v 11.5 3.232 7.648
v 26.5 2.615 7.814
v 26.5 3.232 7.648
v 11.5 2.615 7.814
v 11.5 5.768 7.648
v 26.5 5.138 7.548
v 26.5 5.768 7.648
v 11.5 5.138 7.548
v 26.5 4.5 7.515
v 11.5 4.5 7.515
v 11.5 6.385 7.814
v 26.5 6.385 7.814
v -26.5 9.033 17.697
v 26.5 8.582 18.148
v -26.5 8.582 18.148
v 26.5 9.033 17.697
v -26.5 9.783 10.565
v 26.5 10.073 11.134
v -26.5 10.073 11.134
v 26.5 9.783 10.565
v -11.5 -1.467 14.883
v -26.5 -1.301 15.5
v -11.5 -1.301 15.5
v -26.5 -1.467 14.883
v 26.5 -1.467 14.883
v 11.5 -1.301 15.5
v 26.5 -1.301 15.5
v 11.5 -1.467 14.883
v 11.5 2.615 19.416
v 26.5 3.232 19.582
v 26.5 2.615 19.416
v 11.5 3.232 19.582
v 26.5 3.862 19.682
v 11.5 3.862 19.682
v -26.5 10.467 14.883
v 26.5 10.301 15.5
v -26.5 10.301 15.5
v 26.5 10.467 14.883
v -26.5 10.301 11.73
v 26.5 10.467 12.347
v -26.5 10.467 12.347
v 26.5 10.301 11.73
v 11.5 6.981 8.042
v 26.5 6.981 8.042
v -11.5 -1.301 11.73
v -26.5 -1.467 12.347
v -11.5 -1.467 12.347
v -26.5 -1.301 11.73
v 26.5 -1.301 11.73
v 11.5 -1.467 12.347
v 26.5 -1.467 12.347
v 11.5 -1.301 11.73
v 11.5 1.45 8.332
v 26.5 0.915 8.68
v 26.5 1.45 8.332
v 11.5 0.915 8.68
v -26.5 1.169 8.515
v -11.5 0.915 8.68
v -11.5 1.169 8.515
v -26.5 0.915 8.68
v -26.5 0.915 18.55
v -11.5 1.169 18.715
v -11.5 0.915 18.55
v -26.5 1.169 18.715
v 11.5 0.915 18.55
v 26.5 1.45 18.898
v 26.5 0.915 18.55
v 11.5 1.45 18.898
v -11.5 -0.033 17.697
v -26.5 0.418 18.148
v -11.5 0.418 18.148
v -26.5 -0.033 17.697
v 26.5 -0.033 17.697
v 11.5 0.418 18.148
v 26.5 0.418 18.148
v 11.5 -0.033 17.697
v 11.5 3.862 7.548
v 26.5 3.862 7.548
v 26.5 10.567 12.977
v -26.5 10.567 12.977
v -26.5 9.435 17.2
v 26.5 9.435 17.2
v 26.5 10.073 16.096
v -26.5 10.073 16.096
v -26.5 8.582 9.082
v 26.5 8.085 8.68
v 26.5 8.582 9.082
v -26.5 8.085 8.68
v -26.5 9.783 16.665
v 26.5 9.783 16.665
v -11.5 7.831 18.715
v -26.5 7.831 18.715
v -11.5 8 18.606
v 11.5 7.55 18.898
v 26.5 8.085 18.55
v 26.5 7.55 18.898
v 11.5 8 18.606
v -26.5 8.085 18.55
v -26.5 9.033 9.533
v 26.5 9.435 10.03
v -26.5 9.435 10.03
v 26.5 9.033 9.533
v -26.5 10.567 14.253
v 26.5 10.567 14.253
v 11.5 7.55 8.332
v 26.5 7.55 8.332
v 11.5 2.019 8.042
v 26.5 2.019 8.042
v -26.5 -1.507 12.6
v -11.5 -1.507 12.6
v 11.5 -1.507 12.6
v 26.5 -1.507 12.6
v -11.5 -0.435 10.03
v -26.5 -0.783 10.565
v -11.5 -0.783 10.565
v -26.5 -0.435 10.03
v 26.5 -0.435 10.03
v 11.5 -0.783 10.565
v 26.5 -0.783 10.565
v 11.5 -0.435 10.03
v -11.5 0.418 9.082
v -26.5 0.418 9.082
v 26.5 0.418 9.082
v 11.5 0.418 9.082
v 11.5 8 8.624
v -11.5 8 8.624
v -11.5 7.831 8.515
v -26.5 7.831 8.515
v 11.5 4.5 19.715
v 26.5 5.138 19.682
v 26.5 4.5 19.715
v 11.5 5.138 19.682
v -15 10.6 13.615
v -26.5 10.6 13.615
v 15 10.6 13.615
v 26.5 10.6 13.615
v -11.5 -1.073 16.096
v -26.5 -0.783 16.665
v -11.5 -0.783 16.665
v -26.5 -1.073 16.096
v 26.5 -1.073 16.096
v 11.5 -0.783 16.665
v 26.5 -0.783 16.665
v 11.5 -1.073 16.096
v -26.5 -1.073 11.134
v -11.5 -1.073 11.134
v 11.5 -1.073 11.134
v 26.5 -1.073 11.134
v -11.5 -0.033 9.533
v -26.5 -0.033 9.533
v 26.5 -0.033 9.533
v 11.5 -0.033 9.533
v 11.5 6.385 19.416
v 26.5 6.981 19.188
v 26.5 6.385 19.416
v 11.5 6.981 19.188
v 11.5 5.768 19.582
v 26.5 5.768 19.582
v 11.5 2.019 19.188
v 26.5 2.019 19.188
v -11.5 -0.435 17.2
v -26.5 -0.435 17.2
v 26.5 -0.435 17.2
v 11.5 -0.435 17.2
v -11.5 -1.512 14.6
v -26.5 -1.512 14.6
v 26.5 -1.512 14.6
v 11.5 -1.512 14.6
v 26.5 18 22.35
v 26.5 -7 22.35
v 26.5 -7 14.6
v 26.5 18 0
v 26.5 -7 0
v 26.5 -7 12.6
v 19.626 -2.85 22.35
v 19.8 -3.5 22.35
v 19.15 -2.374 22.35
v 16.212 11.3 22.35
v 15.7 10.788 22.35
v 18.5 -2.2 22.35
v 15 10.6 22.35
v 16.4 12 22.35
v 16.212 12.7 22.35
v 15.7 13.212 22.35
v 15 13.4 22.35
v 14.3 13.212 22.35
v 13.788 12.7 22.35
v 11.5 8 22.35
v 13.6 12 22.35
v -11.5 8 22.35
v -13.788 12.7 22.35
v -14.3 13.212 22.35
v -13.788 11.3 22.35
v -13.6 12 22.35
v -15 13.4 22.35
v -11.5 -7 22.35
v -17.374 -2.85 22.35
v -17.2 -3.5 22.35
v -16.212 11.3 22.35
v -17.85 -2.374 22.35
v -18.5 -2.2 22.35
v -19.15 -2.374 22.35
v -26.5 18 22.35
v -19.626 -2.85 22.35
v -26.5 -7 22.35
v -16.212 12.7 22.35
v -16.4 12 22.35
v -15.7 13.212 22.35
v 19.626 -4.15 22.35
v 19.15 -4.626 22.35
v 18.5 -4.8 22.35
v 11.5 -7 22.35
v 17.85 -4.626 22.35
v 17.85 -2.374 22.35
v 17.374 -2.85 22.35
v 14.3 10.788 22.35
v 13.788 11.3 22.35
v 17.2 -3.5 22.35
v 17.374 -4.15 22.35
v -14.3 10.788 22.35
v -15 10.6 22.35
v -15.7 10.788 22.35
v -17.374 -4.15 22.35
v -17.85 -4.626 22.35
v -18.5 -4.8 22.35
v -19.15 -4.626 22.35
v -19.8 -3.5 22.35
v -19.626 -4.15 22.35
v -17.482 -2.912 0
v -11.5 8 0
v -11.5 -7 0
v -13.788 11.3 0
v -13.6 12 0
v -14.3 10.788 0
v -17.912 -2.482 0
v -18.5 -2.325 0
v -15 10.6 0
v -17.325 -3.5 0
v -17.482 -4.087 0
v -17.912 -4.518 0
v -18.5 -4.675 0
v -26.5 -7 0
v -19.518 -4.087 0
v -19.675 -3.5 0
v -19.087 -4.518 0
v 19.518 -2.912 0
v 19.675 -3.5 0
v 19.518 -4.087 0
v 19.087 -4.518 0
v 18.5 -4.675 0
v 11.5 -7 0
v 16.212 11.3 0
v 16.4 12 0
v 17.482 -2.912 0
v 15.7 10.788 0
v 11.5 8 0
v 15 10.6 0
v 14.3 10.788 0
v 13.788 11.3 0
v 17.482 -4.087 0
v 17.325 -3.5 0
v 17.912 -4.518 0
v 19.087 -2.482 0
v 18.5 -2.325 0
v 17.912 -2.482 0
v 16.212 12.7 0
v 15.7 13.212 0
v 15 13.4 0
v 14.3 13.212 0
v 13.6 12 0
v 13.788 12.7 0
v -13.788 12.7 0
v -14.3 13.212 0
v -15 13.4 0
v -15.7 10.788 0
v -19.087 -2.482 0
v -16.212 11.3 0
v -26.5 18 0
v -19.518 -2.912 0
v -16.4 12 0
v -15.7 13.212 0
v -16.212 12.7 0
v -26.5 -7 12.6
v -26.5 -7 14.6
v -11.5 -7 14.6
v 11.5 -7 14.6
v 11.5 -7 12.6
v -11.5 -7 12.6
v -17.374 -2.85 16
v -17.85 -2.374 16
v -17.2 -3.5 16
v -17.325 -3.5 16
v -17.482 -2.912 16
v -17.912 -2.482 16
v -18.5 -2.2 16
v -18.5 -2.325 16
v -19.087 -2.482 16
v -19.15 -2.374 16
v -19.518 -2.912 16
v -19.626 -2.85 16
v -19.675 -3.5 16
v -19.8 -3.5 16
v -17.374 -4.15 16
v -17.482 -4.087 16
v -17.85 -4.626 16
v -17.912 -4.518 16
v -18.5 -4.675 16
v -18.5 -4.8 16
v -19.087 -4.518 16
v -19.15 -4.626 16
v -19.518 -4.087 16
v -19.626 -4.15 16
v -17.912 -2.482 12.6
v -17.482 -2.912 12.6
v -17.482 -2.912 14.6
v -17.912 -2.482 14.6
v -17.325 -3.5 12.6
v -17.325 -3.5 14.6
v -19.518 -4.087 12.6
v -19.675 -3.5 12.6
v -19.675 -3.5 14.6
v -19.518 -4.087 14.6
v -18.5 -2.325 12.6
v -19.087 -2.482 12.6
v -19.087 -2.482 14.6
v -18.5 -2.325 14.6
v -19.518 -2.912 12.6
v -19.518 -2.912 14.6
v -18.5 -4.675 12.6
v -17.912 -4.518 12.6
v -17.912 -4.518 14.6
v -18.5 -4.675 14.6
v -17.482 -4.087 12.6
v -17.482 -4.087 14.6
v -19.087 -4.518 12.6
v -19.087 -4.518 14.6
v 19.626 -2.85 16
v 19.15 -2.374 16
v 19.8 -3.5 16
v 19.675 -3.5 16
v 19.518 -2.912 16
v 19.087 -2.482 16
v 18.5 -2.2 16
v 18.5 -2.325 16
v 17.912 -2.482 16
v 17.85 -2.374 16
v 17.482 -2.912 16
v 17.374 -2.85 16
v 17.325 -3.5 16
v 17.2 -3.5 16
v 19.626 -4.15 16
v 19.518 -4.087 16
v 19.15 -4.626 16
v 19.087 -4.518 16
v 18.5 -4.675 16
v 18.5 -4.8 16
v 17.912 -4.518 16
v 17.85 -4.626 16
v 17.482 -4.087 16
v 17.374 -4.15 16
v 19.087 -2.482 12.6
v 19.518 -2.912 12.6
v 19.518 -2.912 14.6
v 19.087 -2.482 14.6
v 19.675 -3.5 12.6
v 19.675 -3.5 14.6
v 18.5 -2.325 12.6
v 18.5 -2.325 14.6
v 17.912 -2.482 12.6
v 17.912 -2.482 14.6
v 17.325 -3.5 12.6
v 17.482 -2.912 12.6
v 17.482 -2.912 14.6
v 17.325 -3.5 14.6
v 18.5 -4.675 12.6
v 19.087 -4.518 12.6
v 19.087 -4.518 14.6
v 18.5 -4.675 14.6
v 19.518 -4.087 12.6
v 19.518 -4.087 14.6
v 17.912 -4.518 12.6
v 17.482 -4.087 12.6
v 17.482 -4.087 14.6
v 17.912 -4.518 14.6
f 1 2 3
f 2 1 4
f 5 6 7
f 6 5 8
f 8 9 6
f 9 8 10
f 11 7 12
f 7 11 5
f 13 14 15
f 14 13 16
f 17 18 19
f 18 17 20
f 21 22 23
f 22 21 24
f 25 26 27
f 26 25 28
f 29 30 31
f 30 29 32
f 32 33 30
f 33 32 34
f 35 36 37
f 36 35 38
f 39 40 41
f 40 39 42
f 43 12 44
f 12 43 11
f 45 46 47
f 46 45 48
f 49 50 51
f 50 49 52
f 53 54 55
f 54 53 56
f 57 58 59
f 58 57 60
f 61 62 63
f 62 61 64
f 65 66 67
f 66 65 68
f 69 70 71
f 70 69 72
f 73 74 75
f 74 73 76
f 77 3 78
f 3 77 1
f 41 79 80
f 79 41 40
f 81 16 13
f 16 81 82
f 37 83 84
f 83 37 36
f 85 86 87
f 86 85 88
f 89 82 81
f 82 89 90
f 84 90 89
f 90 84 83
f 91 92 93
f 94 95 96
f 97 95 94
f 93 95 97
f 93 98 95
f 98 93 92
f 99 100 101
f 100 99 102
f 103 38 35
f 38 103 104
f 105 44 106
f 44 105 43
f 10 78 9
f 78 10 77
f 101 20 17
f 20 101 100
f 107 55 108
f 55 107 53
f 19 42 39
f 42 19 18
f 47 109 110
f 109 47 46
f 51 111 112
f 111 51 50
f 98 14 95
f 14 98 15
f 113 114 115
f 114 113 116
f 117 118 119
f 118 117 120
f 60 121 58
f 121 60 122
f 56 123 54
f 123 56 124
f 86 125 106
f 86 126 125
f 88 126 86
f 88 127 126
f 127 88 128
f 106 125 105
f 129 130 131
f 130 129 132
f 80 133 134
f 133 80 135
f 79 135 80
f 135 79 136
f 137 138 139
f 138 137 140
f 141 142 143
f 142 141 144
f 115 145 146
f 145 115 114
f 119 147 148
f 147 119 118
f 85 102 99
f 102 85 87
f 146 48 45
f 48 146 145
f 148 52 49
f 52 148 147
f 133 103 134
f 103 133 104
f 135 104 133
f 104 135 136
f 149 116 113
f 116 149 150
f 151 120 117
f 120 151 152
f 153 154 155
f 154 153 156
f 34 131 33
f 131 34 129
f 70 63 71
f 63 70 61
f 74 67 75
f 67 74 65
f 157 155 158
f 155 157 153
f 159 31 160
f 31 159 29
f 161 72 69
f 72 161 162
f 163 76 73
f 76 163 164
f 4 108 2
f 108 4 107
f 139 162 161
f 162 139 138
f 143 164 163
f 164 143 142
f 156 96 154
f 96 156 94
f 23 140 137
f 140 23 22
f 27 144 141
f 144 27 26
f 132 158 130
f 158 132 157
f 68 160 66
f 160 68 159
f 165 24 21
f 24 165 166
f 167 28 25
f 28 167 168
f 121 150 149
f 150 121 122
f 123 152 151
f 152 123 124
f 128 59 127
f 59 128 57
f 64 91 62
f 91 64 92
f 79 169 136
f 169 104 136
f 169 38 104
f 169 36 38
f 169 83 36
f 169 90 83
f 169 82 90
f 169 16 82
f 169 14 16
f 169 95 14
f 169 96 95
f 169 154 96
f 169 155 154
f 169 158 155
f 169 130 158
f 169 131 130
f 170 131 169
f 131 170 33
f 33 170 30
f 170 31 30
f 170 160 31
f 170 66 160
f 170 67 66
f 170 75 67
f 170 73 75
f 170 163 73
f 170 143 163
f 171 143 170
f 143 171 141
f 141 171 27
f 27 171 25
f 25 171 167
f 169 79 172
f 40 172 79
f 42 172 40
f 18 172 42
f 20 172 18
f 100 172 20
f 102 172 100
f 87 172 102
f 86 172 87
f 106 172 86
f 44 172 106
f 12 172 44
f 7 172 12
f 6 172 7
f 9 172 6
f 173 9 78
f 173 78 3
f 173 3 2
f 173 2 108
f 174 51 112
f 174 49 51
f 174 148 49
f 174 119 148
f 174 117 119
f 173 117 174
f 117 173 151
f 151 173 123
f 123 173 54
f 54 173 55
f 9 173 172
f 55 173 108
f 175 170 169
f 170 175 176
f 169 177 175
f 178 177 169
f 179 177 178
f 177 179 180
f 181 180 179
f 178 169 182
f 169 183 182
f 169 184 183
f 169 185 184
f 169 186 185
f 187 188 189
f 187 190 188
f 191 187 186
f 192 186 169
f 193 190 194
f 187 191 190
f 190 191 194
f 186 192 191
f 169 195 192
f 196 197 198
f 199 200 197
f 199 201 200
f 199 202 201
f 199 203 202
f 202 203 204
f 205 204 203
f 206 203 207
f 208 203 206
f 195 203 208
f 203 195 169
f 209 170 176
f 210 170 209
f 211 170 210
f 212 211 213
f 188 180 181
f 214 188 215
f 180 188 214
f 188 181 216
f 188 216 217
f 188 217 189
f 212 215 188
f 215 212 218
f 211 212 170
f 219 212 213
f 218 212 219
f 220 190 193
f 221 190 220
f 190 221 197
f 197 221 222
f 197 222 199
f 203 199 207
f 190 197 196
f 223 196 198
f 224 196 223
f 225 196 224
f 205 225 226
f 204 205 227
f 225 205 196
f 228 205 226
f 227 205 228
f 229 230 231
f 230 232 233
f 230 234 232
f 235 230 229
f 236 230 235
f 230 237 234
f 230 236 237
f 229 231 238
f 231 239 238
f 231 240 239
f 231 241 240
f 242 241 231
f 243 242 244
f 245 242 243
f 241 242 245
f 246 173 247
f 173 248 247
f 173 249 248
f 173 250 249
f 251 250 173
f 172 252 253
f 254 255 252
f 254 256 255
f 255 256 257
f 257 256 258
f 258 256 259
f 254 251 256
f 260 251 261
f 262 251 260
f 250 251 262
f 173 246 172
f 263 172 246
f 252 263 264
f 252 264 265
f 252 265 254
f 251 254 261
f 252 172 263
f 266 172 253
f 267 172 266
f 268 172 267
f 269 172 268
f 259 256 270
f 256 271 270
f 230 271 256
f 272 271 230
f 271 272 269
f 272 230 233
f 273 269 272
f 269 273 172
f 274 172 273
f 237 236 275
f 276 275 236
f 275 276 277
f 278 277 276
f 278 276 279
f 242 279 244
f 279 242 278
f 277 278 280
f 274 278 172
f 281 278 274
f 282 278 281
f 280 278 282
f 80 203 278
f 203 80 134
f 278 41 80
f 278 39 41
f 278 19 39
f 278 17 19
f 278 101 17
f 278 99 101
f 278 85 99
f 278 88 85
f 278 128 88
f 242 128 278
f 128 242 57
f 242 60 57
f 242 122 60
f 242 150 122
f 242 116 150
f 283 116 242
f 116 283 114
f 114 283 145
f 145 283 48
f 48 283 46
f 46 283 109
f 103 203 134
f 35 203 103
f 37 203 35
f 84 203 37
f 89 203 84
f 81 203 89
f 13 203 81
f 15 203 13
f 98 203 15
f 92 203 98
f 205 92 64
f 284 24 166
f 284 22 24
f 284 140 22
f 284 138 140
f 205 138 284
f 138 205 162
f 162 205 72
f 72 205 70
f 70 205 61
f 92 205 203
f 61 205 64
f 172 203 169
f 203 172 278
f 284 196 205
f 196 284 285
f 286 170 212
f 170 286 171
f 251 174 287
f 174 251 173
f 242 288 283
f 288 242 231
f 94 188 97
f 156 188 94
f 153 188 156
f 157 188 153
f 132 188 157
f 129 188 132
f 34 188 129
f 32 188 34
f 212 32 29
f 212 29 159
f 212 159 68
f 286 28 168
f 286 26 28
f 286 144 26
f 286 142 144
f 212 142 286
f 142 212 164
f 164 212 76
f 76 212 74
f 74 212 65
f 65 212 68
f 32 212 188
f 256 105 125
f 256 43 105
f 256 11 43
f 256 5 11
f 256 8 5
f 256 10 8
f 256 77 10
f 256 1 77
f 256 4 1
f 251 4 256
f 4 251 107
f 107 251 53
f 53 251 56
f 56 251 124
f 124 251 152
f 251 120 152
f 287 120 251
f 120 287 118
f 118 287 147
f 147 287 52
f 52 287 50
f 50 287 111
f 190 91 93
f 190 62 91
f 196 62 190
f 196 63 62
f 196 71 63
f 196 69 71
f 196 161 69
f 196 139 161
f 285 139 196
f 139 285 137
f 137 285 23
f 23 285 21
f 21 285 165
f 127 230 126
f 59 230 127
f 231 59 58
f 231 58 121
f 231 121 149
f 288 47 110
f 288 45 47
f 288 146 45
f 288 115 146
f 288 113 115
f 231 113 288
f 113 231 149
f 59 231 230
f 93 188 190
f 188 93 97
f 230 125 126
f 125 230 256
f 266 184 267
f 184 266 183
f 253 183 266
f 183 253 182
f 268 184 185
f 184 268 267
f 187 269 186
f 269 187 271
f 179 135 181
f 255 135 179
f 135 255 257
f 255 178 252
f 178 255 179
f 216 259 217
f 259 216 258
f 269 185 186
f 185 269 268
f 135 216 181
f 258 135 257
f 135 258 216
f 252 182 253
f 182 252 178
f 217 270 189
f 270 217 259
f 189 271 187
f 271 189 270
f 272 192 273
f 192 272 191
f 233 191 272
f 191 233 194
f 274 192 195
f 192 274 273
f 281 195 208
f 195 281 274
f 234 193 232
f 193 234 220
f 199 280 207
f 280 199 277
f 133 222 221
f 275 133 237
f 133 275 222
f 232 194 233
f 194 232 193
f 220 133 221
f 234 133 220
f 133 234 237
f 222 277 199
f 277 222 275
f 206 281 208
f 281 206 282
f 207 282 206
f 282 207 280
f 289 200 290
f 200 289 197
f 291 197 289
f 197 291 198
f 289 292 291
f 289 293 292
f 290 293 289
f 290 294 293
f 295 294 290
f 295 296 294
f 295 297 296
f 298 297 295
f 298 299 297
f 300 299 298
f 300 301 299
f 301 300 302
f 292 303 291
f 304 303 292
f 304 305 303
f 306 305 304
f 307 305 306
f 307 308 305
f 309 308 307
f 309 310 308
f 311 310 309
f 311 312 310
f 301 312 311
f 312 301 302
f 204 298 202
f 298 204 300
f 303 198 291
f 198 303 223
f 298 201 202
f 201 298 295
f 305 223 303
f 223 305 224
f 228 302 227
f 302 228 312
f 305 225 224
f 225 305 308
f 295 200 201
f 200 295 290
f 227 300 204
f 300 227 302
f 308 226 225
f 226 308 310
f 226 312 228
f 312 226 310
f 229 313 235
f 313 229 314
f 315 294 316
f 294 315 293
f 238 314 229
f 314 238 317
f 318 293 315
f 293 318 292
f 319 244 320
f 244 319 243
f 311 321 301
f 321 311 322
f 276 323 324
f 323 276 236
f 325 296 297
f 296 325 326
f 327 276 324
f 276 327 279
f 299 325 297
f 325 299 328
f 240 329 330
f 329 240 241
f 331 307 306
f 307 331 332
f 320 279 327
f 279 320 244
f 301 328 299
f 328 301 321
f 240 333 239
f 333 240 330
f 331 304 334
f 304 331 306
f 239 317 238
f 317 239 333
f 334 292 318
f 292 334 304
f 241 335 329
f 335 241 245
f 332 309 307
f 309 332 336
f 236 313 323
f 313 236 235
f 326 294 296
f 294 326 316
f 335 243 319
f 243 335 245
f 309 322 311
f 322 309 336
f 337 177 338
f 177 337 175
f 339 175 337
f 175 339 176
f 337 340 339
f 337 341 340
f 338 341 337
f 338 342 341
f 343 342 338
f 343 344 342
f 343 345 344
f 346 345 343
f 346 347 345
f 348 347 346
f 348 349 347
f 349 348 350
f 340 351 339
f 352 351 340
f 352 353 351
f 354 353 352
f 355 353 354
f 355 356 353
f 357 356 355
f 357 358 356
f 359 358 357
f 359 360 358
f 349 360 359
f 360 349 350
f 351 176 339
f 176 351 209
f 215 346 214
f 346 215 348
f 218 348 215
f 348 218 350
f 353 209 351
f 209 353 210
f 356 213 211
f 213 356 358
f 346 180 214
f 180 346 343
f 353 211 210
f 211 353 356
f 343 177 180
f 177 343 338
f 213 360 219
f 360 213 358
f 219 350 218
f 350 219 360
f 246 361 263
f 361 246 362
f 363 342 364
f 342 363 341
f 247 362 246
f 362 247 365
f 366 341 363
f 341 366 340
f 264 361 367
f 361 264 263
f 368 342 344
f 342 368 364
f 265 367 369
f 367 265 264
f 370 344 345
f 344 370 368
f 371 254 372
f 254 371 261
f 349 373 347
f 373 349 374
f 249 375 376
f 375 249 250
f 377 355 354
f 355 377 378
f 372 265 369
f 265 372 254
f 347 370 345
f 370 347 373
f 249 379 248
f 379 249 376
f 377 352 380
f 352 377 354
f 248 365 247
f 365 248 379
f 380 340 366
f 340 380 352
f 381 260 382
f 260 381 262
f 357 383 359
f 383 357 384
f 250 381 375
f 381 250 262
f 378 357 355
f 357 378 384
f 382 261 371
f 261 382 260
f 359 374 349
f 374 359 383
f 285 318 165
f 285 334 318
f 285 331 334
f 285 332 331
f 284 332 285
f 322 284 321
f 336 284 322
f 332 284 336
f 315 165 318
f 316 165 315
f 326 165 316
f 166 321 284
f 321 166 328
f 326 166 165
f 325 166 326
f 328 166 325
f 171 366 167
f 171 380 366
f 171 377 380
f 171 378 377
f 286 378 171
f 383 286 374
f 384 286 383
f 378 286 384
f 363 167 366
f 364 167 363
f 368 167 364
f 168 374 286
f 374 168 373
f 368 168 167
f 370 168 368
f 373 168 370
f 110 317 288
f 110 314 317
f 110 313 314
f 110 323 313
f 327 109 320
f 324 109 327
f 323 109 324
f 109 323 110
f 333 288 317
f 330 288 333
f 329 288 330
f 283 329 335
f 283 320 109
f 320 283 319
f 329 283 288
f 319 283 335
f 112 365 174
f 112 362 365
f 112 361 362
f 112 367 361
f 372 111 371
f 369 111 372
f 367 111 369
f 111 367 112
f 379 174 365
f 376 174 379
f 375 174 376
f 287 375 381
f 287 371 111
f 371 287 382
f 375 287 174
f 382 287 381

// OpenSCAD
$fn=12;

difference(){
translate([-26.5,-7,0])cube([53,25,22.35]);
translate([-11.5,-17,-1])cube([23,25,24]);
translate([15,12,-1])cylinder(d=2.8,h=32);    
translate([-15,12,-1])cylinder(d=2.8,h=32); 

translate([0,0,22.35])rotate([0,90,0])
difference(){
    translate([8.735,4.5,-30])cylinder(d=12.2,h=60,$fn=60);
    translate([14.835,4.5,-30])cube([2,16,60],center=true);
    translate([2.635,4.5,-30])cube([2,16,60],center=true);
}

translate([-18.5,-3.5,16])cylinder(d=2.6,h=11,$fn=12);
translate([-18.5,-3.5,-1])cylinder(d=2.35,h=24,$fn=12);
translate([18.5,-3.5,16])cylinder(d=2.6,h=11,$fn=12);
translate([18.5,-3.5,-1])cylinder(d=2.35,h=24,$fn=12);

translate([-30,-20,12.6])cube([60,20,2]);
}
